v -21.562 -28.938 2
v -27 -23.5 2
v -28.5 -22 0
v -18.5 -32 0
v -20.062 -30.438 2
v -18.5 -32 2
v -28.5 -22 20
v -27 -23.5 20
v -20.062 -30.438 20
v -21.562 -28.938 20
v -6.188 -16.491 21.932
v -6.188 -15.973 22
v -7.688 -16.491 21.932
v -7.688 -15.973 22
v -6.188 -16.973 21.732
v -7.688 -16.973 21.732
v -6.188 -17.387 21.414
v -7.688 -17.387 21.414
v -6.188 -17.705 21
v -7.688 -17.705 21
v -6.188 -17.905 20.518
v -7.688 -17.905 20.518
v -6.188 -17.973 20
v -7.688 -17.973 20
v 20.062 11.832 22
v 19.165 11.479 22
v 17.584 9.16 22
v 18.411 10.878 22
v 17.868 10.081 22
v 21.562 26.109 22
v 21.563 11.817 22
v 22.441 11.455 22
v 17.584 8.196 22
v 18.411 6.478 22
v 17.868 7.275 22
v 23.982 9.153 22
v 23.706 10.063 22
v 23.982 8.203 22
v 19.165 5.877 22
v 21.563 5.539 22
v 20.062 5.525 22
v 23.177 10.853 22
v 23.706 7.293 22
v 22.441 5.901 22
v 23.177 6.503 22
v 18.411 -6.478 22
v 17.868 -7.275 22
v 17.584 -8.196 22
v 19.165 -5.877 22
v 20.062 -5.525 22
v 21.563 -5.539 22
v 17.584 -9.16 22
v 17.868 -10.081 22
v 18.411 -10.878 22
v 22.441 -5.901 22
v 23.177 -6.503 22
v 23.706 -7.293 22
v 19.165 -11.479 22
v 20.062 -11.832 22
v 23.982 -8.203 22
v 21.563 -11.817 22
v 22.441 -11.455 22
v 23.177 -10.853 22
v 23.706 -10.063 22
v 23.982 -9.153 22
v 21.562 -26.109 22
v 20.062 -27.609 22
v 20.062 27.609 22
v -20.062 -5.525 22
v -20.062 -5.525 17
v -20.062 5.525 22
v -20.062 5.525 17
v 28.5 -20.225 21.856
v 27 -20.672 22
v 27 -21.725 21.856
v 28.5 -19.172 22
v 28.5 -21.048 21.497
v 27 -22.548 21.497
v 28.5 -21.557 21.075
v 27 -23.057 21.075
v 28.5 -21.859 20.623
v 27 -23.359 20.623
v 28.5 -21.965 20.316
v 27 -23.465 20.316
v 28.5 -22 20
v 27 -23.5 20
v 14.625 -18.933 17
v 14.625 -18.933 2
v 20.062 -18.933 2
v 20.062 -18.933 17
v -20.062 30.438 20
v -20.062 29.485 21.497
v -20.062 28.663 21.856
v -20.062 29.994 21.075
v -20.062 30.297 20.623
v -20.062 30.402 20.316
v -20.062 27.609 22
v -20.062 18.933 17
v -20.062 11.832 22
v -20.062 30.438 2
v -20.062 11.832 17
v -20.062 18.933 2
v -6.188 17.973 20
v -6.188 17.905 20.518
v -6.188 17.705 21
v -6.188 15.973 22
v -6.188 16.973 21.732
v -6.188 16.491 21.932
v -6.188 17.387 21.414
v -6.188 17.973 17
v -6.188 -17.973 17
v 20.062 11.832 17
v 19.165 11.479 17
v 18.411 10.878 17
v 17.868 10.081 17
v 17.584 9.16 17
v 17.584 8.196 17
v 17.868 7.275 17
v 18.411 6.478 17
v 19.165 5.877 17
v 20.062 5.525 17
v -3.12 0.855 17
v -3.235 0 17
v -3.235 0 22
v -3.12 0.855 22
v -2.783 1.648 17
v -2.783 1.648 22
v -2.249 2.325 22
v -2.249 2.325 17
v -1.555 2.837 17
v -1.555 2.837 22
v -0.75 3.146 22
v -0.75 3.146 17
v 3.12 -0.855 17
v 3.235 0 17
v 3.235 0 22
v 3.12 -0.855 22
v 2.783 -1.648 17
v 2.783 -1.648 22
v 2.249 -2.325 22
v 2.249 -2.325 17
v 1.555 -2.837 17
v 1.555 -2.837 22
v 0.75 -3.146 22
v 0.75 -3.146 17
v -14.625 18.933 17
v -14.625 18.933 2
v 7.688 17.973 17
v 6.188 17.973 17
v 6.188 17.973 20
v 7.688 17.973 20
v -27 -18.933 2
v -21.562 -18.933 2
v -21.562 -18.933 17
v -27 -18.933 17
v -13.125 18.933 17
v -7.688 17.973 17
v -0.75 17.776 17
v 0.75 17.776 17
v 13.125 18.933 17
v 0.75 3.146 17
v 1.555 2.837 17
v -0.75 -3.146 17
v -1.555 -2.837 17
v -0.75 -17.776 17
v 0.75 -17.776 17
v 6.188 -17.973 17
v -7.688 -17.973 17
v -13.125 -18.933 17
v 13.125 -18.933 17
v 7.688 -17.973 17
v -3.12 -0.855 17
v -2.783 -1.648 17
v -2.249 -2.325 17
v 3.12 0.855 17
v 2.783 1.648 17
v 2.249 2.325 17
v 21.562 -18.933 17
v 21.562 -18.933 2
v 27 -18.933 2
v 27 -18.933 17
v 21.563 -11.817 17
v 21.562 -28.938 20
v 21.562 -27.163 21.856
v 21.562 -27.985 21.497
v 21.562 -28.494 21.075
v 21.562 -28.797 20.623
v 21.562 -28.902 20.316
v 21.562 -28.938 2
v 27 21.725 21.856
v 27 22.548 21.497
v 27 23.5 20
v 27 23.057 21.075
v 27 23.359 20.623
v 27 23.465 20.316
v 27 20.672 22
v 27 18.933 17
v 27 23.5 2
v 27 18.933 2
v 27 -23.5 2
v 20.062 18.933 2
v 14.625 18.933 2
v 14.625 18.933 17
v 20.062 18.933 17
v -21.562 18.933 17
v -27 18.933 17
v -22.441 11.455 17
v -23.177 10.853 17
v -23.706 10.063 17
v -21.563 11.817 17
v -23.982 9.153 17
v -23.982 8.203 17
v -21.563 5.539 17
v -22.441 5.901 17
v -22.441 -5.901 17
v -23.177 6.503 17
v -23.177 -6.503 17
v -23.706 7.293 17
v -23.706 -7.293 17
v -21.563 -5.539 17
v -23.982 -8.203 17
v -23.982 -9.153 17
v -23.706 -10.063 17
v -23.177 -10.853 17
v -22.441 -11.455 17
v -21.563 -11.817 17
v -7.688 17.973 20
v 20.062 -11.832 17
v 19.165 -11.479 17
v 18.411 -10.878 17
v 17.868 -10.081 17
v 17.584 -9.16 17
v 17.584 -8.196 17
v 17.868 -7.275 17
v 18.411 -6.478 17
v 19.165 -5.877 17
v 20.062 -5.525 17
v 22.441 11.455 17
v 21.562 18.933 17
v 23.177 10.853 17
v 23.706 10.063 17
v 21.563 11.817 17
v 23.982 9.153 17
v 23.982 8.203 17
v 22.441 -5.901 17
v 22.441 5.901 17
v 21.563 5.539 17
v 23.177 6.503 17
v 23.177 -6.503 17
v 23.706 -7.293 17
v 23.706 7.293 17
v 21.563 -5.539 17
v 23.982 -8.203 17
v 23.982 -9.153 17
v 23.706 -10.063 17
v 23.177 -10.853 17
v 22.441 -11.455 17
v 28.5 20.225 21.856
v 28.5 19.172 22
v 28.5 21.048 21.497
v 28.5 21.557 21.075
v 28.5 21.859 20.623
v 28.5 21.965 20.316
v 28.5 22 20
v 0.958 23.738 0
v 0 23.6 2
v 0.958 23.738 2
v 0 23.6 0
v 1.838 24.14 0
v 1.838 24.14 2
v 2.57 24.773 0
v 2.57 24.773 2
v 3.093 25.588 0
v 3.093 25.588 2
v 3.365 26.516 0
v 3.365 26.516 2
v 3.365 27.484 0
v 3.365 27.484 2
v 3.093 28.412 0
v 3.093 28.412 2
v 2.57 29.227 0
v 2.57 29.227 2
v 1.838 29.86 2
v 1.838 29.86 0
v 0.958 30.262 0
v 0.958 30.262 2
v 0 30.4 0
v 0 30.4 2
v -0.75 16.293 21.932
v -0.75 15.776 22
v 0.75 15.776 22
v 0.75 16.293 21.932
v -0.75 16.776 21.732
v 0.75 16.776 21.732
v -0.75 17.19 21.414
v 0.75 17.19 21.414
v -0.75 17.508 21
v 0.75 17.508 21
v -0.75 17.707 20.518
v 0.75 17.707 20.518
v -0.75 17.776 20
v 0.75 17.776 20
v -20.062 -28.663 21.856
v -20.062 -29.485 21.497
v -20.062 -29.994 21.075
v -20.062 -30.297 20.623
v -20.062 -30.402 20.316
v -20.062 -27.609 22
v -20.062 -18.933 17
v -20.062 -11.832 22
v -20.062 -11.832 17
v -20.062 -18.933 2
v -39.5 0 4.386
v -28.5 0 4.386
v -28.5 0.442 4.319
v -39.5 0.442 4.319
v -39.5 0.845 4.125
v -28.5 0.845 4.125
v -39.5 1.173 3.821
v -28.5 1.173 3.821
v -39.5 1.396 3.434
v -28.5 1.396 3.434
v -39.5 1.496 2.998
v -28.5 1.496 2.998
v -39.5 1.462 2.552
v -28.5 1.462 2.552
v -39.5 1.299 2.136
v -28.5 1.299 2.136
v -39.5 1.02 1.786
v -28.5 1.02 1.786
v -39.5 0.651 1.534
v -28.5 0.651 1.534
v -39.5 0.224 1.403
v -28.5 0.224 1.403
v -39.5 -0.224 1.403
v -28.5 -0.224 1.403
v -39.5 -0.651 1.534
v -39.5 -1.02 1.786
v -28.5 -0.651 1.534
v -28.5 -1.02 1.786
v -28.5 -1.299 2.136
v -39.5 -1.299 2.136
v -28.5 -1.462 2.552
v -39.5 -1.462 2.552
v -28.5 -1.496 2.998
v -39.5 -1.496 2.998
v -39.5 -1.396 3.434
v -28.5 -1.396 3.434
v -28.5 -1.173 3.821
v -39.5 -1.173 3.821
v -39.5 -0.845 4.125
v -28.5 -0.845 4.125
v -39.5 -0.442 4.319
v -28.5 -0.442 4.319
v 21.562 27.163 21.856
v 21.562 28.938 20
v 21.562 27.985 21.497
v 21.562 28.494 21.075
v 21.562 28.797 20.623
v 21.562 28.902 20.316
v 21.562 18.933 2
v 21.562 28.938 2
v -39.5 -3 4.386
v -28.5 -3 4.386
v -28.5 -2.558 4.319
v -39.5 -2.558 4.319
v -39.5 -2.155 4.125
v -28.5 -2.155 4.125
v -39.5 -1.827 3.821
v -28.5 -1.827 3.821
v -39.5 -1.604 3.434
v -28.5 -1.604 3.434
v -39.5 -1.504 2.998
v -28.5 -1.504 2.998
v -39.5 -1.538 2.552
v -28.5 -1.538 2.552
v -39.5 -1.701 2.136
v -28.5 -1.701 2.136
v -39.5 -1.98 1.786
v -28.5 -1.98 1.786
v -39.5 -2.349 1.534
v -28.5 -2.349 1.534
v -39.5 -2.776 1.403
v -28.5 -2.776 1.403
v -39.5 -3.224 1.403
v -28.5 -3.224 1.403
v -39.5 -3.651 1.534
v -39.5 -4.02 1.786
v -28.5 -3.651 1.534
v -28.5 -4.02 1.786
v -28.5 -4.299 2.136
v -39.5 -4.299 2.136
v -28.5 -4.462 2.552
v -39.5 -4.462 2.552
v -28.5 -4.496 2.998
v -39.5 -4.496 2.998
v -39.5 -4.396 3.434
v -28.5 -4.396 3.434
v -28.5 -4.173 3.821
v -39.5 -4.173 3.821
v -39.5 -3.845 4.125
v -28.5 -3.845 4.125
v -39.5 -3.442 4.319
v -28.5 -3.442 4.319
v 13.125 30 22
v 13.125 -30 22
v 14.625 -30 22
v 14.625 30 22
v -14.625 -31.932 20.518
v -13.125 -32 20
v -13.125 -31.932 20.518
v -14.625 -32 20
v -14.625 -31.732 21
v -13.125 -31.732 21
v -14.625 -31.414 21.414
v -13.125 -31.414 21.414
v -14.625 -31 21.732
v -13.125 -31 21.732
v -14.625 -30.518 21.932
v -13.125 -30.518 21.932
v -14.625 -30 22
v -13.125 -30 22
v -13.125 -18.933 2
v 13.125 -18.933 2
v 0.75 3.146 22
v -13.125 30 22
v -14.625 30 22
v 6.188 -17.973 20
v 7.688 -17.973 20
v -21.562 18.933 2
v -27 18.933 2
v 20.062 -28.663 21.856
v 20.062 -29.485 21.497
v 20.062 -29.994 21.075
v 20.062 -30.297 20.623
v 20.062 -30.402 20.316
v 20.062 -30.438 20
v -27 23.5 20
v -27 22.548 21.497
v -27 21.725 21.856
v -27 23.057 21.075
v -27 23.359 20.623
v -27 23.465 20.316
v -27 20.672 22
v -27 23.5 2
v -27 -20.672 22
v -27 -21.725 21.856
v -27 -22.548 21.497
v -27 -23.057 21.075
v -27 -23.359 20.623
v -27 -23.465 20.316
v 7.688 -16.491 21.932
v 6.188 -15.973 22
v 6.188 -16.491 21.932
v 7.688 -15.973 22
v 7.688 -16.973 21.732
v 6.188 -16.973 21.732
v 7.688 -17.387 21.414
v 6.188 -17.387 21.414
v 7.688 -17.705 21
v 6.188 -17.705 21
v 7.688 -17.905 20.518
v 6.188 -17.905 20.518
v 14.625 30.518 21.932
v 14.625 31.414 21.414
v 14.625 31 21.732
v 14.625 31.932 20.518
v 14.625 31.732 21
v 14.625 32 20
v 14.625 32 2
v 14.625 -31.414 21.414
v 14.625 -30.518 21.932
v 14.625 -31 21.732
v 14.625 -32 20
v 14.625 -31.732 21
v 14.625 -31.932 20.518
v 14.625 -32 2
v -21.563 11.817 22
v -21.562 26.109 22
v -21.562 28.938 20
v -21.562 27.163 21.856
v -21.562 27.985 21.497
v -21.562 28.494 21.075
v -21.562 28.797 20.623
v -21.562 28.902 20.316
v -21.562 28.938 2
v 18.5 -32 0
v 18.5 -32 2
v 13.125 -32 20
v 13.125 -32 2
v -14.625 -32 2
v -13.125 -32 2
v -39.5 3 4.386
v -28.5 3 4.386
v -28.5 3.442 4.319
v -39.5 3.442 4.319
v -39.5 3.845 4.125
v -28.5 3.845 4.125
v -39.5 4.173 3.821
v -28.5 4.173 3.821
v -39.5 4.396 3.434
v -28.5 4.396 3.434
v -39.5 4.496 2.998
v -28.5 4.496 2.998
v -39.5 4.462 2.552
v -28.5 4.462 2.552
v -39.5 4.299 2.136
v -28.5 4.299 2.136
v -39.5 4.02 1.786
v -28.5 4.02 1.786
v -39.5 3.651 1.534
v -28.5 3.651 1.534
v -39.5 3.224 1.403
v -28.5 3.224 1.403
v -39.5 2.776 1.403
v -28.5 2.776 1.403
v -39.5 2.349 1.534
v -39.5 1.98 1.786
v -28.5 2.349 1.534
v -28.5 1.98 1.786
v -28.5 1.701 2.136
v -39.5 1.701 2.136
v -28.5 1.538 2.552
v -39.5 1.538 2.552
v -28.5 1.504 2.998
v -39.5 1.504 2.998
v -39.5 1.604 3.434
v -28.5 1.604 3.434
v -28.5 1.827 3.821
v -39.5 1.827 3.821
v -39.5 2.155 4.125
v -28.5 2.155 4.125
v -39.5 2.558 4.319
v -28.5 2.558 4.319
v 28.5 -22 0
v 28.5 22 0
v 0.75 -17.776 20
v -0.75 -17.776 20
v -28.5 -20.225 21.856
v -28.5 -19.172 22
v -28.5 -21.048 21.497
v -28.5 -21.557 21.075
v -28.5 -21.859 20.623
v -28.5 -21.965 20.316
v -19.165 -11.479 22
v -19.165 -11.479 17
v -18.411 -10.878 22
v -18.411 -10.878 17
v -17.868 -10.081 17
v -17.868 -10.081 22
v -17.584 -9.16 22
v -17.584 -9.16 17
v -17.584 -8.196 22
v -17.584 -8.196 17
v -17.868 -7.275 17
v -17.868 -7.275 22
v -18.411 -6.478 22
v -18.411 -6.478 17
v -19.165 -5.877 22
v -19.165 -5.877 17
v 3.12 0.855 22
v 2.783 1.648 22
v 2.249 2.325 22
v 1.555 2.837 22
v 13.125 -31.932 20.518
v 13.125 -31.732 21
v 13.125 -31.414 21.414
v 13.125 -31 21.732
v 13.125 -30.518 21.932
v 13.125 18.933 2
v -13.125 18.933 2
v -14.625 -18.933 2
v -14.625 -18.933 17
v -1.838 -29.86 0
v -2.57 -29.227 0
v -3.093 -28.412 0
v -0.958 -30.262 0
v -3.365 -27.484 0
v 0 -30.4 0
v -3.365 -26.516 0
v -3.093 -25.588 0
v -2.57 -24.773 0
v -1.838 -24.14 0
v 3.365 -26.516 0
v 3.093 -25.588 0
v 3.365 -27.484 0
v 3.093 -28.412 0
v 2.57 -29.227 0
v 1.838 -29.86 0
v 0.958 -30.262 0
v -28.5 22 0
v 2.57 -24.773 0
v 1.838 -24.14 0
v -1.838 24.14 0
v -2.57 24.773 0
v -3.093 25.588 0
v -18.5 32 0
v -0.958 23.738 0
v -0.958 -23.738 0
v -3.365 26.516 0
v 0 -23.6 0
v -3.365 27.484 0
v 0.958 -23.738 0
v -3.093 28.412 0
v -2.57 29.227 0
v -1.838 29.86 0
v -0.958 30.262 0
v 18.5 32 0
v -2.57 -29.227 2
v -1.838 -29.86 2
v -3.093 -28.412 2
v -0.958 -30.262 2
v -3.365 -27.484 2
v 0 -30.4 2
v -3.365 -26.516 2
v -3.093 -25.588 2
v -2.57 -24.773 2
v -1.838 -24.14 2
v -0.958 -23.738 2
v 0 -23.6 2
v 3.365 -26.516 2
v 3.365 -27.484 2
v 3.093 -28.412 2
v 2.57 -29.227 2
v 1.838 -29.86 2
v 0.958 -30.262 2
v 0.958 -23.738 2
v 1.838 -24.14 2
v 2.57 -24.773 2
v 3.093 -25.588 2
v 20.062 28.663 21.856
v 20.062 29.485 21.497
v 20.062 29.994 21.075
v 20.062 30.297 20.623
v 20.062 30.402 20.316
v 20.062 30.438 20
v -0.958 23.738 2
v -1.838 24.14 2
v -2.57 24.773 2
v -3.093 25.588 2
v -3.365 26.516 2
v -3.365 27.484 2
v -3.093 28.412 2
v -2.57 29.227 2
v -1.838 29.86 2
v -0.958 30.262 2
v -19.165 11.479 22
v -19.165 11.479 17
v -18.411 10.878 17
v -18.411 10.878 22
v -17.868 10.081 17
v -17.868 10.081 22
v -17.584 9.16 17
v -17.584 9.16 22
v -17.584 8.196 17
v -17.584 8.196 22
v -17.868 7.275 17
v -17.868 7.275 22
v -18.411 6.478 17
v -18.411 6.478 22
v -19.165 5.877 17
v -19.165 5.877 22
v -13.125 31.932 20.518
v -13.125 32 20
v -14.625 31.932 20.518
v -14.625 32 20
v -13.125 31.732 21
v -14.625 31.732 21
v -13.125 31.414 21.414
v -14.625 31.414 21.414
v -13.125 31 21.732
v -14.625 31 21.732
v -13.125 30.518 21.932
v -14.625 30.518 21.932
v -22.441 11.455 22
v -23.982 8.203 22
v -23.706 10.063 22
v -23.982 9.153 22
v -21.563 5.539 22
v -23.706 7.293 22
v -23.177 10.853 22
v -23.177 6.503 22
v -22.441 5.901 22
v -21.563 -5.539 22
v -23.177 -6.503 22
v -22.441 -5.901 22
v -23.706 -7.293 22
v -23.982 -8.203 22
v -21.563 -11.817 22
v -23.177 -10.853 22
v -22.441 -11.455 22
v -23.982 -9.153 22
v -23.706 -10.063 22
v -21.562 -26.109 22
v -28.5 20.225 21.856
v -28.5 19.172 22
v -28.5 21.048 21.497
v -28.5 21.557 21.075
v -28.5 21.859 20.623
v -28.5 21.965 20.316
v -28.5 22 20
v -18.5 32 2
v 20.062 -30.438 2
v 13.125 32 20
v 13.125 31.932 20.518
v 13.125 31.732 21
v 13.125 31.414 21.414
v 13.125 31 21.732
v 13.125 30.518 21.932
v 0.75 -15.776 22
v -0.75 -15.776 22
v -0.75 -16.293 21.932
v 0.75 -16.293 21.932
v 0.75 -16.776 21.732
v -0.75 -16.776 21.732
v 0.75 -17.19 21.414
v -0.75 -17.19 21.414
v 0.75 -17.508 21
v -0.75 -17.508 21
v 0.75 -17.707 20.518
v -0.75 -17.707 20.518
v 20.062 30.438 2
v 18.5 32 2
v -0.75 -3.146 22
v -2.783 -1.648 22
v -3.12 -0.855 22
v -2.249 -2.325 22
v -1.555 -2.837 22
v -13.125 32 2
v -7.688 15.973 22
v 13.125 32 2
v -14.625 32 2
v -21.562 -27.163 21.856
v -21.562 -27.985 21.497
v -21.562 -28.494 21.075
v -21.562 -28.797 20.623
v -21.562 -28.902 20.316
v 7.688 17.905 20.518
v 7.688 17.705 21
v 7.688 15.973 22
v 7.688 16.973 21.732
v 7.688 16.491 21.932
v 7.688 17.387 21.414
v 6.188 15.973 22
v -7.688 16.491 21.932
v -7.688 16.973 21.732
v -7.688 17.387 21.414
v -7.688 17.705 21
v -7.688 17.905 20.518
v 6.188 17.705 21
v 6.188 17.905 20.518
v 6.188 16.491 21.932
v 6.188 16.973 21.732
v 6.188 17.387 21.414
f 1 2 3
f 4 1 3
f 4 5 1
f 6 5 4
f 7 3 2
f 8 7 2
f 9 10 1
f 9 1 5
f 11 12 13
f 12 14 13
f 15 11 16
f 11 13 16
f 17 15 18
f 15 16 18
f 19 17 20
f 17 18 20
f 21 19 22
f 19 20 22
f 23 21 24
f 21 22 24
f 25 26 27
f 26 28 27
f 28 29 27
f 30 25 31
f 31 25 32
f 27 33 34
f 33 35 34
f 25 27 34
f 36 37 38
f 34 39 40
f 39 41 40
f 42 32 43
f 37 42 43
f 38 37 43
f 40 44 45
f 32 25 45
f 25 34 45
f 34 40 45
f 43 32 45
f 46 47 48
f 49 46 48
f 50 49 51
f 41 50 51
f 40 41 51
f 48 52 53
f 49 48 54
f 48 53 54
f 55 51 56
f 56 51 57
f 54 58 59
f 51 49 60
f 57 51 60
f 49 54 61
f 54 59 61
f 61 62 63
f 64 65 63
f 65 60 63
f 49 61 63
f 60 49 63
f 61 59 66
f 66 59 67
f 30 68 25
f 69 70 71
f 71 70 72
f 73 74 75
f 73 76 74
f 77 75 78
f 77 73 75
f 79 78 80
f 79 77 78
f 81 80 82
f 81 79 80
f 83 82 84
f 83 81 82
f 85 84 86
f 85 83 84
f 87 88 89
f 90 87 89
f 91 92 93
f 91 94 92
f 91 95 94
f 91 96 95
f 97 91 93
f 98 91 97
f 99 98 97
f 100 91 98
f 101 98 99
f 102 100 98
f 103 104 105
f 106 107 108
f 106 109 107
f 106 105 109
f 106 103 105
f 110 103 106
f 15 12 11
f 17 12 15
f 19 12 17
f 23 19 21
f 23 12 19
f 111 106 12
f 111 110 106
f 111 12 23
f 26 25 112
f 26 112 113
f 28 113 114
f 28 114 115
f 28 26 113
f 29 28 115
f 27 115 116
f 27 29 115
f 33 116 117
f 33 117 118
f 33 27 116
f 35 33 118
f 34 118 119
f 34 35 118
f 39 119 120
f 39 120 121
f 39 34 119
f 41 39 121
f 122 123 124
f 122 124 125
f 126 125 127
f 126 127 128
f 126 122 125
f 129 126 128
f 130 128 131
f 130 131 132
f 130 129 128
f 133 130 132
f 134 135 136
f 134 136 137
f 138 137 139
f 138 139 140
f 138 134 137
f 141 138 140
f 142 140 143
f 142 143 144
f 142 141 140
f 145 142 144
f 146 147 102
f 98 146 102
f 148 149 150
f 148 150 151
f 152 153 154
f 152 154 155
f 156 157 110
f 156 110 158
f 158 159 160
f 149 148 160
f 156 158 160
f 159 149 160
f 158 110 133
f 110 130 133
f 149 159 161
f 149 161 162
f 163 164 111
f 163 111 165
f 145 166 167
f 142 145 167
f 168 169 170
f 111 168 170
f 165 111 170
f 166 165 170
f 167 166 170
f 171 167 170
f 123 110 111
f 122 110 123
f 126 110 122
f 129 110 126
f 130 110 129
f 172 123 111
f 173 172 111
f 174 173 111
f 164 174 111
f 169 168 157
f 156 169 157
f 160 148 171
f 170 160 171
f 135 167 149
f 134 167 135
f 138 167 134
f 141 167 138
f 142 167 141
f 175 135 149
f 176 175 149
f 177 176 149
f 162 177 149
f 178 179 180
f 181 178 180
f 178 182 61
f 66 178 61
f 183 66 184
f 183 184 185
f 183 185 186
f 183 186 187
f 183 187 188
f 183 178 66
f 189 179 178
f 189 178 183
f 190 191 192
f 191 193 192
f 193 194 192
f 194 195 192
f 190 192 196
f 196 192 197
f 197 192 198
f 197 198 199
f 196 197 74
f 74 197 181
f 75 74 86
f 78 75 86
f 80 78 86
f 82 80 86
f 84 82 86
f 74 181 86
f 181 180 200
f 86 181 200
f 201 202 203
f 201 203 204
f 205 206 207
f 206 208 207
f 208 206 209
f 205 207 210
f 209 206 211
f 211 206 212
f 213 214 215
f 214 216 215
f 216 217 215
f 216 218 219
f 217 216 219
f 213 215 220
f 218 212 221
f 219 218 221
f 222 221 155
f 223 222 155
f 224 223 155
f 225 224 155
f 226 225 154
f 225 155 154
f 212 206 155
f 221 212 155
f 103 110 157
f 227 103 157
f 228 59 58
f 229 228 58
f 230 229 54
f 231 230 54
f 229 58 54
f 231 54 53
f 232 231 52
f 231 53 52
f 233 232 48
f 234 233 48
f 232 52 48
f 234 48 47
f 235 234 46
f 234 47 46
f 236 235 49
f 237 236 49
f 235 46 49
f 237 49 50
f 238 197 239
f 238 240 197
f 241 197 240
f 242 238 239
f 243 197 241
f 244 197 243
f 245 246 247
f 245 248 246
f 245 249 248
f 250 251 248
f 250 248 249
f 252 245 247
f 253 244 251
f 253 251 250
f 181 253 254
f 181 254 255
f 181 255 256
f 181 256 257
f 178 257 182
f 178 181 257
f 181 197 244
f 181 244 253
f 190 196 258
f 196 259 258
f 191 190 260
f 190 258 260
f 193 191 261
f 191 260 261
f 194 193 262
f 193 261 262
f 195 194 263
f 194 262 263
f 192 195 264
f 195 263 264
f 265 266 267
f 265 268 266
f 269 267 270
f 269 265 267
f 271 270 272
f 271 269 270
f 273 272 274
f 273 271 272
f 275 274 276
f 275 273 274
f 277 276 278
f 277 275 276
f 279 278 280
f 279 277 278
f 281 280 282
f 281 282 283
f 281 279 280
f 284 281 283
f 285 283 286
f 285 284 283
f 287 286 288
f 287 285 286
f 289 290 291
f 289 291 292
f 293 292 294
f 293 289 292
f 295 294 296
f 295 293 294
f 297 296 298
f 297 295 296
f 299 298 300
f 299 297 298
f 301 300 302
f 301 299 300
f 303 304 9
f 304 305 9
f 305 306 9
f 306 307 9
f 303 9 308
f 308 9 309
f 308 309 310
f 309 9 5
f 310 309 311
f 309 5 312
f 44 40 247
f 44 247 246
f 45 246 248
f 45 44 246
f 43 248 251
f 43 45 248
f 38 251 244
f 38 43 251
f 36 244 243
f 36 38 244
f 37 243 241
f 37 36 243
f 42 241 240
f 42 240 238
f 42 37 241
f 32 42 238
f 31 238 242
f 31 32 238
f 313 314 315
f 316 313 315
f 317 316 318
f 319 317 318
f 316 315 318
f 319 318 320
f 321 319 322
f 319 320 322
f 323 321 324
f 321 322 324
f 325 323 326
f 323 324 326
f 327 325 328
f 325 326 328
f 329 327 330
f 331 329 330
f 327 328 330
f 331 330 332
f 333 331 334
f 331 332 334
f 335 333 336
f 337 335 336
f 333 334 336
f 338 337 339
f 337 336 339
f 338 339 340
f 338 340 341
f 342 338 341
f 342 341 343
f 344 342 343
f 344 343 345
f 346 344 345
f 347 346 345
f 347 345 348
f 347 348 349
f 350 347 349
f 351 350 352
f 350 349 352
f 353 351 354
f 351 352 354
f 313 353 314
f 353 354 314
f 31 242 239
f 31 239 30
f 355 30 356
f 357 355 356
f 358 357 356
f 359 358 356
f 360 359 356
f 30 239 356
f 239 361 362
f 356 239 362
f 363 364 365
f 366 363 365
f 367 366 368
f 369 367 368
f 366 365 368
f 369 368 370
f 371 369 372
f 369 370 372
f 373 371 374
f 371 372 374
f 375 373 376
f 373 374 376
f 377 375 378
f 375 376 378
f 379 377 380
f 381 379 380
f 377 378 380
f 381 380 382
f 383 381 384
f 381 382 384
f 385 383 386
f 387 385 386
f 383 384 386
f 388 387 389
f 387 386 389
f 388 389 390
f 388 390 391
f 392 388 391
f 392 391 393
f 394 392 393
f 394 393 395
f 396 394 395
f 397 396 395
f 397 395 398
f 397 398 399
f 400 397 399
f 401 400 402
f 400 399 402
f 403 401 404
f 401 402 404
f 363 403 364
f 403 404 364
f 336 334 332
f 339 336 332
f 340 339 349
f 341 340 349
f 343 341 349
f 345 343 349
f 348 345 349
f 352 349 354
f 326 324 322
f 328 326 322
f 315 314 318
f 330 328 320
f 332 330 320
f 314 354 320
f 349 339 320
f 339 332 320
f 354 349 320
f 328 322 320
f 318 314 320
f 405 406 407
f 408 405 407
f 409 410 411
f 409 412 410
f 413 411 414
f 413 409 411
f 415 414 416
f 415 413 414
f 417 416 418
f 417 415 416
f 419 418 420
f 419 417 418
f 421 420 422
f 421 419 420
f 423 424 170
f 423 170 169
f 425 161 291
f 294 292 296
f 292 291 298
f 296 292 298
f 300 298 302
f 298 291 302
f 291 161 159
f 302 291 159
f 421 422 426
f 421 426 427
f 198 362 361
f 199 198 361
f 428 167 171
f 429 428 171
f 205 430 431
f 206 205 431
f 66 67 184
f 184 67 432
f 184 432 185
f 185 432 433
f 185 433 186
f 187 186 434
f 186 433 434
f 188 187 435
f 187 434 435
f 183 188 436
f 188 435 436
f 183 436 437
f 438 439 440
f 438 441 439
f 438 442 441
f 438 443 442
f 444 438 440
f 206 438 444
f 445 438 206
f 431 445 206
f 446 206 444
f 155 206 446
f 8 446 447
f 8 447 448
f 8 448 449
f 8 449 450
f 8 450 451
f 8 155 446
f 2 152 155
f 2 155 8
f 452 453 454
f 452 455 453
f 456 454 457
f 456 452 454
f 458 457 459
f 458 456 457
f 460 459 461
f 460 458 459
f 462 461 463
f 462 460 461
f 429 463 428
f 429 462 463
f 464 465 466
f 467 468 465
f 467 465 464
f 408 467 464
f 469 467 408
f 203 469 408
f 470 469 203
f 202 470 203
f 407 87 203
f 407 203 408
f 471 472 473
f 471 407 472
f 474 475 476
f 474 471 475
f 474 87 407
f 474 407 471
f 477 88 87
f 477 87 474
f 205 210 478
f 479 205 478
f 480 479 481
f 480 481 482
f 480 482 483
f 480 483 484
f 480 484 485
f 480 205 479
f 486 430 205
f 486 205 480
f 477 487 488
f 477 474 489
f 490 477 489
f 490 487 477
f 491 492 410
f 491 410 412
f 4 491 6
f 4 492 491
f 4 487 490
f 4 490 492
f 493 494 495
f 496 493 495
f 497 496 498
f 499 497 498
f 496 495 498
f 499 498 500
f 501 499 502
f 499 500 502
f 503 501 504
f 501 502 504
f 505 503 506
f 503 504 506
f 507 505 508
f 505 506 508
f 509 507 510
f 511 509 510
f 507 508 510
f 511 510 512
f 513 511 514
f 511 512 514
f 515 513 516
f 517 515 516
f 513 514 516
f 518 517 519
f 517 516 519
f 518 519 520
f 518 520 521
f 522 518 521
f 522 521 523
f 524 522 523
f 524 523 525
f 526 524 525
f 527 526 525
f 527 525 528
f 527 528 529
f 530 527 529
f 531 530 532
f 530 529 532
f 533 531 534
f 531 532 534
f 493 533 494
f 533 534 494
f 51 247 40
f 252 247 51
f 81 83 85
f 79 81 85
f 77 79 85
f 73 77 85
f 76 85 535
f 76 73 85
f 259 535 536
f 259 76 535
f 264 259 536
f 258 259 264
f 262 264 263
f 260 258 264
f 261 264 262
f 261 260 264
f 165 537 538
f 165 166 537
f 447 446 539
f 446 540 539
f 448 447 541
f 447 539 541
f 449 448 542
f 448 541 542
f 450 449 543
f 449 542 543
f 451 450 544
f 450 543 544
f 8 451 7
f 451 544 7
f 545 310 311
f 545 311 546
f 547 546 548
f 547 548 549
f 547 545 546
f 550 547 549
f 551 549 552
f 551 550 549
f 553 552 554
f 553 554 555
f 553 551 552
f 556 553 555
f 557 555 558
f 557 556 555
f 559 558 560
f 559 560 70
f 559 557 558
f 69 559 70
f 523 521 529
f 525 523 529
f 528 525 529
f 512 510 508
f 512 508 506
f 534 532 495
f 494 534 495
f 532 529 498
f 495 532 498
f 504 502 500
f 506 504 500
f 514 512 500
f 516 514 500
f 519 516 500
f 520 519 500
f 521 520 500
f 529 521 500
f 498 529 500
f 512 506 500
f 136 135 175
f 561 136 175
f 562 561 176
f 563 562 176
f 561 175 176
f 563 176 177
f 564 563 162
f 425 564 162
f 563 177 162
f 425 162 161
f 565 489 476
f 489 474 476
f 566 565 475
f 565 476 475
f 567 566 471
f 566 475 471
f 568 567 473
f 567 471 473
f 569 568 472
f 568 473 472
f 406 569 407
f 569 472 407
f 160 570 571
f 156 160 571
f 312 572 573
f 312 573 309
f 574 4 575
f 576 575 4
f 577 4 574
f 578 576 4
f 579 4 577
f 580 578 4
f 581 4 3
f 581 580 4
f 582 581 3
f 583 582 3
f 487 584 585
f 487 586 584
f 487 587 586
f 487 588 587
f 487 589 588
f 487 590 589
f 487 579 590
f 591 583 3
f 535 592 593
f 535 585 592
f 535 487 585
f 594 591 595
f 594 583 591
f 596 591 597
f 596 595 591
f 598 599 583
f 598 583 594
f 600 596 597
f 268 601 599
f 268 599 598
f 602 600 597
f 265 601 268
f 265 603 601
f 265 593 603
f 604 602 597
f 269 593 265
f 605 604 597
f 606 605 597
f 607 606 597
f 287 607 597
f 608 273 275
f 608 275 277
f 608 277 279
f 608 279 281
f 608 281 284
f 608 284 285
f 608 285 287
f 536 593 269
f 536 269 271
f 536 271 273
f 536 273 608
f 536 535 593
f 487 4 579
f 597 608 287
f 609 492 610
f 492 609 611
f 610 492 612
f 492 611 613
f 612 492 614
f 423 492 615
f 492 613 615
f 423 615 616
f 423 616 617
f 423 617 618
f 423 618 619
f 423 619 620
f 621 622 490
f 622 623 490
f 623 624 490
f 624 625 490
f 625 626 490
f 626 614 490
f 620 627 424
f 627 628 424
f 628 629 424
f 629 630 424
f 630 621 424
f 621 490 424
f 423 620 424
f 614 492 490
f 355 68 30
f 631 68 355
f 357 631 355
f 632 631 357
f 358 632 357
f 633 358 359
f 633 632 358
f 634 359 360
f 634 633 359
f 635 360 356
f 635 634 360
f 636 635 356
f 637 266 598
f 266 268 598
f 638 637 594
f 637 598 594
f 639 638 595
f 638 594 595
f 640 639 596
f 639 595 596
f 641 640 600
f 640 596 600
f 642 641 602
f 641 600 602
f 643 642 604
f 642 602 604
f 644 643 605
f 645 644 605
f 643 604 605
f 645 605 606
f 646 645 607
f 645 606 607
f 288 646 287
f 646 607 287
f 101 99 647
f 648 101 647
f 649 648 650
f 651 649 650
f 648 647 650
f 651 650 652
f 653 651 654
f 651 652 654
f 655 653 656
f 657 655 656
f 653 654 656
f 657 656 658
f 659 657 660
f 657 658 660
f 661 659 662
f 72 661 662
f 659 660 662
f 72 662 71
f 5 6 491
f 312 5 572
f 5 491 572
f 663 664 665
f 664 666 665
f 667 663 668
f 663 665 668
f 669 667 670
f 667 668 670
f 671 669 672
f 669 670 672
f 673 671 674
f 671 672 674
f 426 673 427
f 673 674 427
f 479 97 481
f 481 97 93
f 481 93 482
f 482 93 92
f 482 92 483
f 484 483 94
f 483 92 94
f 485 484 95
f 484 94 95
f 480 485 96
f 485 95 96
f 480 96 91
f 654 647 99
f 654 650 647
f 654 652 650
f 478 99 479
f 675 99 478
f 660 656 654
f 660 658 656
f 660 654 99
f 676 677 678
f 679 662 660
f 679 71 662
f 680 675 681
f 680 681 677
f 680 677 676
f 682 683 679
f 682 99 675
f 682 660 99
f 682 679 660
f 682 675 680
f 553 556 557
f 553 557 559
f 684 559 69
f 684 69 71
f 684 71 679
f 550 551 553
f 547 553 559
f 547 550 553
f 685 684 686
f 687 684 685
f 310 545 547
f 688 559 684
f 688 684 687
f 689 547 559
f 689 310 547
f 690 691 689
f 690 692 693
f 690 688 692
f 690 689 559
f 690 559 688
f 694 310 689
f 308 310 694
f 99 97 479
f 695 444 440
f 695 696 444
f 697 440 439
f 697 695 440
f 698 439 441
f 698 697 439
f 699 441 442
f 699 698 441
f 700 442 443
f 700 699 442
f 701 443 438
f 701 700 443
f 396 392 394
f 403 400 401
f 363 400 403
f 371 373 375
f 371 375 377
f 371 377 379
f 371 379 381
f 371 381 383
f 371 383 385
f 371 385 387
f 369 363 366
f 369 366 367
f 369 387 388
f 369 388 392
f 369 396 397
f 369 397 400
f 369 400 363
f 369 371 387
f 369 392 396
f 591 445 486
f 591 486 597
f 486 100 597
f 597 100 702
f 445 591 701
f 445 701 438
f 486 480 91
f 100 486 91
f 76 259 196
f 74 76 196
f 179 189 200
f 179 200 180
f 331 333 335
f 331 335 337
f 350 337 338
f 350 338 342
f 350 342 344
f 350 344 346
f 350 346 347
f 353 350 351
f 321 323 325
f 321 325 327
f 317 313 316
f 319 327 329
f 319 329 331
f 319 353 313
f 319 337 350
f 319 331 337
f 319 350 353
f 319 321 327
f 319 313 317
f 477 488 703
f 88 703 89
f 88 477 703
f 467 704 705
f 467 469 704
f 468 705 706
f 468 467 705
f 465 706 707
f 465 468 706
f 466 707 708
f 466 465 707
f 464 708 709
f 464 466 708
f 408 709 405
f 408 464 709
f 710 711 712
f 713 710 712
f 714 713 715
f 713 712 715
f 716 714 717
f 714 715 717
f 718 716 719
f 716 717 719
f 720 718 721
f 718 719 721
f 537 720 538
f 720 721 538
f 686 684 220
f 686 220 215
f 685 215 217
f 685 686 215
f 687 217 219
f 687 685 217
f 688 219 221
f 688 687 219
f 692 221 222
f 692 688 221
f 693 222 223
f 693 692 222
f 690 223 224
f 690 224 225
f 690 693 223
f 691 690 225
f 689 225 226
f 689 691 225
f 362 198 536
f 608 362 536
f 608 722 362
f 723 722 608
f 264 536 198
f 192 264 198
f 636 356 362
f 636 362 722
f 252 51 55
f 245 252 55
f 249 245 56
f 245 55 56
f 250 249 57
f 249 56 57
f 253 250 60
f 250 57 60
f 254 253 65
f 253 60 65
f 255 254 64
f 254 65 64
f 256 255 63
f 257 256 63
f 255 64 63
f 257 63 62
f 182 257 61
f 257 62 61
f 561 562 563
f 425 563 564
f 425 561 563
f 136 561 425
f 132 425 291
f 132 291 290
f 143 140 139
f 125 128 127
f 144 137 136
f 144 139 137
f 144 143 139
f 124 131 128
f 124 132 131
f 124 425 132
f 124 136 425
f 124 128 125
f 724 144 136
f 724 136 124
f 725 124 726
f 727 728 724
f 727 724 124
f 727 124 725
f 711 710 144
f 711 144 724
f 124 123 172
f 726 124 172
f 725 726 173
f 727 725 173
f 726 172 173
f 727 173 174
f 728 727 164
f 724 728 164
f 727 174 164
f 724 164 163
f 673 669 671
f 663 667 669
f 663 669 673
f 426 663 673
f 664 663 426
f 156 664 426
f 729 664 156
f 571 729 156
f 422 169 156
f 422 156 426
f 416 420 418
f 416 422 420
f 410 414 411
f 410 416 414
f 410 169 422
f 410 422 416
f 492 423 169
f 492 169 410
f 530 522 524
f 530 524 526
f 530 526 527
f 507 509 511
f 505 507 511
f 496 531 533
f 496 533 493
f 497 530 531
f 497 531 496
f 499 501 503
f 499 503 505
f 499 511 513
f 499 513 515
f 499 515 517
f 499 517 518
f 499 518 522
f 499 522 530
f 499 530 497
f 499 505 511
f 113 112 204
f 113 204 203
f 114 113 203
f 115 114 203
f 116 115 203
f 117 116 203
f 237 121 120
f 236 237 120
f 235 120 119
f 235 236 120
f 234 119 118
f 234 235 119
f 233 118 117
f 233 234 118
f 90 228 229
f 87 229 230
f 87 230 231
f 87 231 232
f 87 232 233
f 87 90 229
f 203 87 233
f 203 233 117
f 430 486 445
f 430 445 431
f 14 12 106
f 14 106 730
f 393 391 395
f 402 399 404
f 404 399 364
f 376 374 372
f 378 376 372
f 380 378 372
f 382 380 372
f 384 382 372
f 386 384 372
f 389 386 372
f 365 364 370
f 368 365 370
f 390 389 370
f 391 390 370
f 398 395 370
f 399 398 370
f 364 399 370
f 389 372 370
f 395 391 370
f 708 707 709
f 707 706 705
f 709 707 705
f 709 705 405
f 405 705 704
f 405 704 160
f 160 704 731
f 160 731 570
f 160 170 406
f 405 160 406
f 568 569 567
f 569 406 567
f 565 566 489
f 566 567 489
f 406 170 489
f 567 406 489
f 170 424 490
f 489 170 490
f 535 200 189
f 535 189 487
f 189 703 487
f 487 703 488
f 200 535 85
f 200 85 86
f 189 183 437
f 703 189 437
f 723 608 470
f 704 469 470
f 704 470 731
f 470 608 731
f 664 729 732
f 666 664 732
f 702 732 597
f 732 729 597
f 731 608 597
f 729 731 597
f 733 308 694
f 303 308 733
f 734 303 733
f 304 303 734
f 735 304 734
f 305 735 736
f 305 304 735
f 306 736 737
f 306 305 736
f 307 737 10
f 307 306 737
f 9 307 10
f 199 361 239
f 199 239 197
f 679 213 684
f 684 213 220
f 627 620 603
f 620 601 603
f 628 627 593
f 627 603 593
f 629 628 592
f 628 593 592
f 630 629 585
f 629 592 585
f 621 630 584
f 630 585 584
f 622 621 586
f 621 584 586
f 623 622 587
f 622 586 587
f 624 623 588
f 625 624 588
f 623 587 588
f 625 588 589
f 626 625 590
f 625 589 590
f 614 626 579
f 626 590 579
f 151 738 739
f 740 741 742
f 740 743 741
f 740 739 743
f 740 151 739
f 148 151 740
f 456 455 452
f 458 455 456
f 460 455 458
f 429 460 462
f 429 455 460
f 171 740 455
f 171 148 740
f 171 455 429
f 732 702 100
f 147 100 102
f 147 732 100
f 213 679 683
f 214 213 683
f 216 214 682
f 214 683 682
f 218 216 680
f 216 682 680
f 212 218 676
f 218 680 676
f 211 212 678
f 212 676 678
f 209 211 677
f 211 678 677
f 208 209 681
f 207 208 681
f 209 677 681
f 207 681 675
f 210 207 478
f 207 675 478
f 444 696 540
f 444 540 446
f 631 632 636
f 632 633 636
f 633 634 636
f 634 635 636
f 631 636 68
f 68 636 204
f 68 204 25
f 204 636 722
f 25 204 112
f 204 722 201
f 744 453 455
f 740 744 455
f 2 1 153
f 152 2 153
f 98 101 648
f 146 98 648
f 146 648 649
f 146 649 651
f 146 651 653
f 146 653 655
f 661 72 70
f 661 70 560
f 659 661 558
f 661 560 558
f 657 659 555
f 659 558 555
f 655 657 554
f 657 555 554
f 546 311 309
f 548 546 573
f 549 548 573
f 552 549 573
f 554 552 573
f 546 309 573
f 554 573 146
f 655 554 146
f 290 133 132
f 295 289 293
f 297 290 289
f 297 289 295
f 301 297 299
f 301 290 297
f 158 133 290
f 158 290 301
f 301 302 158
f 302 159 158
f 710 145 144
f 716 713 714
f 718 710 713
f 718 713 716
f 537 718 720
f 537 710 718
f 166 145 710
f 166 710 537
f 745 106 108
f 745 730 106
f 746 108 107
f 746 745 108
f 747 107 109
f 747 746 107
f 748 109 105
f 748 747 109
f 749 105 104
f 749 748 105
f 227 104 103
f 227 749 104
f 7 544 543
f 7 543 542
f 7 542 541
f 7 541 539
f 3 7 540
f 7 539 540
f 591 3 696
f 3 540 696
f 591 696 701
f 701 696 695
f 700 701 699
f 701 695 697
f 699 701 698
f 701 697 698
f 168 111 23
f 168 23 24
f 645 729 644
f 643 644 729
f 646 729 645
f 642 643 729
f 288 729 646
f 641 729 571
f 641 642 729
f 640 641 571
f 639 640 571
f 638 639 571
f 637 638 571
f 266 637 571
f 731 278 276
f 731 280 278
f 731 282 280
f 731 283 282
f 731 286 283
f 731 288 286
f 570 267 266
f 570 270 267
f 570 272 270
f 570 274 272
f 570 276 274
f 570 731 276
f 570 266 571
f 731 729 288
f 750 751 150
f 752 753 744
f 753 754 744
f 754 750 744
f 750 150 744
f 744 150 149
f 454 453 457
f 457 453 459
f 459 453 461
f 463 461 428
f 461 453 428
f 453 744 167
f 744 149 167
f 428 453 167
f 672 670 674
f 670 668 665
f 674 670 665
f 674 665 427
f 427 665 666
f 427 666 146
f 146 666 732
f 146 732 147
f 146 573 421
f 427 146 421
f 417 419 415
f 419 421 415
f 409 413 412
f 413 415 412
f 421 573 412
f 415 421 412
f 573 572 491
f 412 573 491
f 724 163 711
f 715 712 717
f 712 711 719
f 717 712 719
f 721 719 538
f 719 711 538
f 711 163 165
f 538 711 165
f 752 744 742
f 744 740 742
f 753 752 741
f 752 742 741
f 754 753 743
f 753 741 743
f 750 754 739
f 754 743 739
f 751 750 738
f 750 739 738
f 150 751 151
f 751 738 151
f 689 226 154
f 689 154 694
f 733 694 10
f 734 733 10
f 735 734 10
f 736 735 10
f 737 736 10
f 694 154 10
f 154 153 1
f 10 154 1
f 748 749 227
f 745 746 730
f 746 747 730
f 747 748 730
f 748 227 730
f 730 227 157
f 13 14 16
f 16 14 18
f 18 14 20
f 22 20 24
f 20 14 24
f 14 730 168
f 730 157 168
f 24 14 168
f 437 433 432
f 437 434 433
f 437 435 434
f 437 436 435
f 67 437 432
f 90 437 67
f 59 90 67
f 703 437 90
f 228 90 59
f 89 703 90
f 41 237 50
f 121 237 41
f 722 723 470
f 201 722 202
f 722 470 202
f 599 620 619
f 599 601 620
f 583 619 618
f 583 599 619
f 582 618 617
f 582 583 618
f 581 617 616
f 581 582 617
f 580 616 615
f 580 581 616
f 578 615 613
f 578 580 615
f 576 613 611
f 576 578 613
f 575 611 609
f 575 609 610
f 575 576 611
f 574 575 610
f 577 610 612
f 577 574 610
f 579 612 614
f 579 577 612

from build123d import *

# Parameters (mm, degrees)
SKIZZE1_R                                   = 3.4
AUFSATZ_LINEAR_AUSTRAGEN1_DEPTH             = 2
SKIZZE2_W                                   = 57
SKIZZE2_H                                   = 18.932808473
AUFSATZ_LINEAR_AUSTRAGEN2_DEPTH             = 15
SCHNITT_LINEAR_AUSTRAGEN1_DEPTH             = 47.100433837
SCHNITT_LINEAR_AUSTRAGEN1_DEPTH_BACK        = 47.100433837
SKIZZE3_W                                   = 34.623433363
SKIZZE3_H                                   = 45.110839659
AUFSATZ_LINEAR_AUSTRAGEN3_REACH             = 48.1
SKIZZE4_W                                   = 1.5
SKIZZE4_H                                   = 32
SKIZZE4_H_2                                 = 17.972917063
SKIZZE4_W_2                                 = 0.75
SKIZZE4_H_3                                 = 17.775625357
AUFSATZ_LINEAR_AUSTRAGEN3_DIRECTION_2_DEPTH = 5
VERRUNDUNG1_R                               = 2
SKIZZE5_R                                   = 3.234578413
AUFSATZ_LINEAR_AUSTRAGEN4_DEPTH             = 5
AUFSATZ_LINEAR_AUSTRAGEN7_DEPTH             = 5
SKIZZE7_R                                   = 1.5
AUFSATZ_LINEAR_AUSTRAGEN9_DEPTH             = 11
AUFSATZ_LINEAR_AUSTRAGEN9_2_DEPTH           = 11
AUFSATZ_LINEAR_AUSTRAGEN9_3_DEPTH           = 11


with BuildPart() as part:
    # Skizze1 → Aufsatz-Linear austragen1 (new body)
    with BuildSketch(Plane(origin=(0, 0, 0), x_dir=(0, 1, 0), z_dir=(0, 0, 1))):
        Polygon((22, 28.5), (32, 18.5), (32, -18.5), (22, -28.5), (0, -28.5), (0, 28.5), align=None)
        with Locations(Location((27, 0, 0), (0, 0, 270))):
            Circle(SKIZZE1_R, mode=Mode.SUBTRACT)
    extrude(amount=AUFSATZ_LINEAR_AUSTRAGEN1_DEPTH)

    # Skizze2 → Aufsatz-Linear austragen2 (add)
    with BuildSketch(Plane.XY.offset(2)):
        with Locations((0, 9.466404237)):
            Rectangle(SKIZZE2_W, SKIZZE2_H)
    extrude(amount=AUFSATZ_LINEAR_AUSTRAGEN2_DEPTH)

    # Skizze3 → Schnitt-Linear austragen1 (cut, two sides: drawn at the far end of the back side and taken through both)
    with BuildSketch(Plane.XY.offset(17).offset(-SCHNITT_LINEAR_AUSTRAGEN1_DEPTH_BACK)):
        with Locations((-17.311716682, 22.555419829)):
            Rectangle(SKIZZE3_W, SKIZZE3_H)
    extrude(amount=SCHNITT_LINEAR_AUSTRAGEN1_DEPTH + SCHNITT_LINEAR_AUSTRAGEN1_DEPTH_BACK, mode=Mode.SUBTRACT)

    # Aufsatz-Linear austragen3: up to this face of the body (flat: up to its plane)
    aufsatz_linear_austragen3_end = Plane(part.part.faces().sort_by_distance((13.22034684, 24.848962234, 2))[0])
    # Skizze4 → Aufsatz-Linear austragen3 (add, up to the picked face)
    with BuildSketch(Plane.XY.offset(17), mode=Mode.PRIVATE) as aufsatz_linear_austragen3_sk1:
        with Locations((13.875, 16)):
            Rectangle(SKIZZE4_W, SKIZZE4_H)
    aufsatz_linear_austragen3_tool1 = split(extrude(aufsatz_linear_austragen3_sk1.sketch, amount=-AUFSATZ_LINEAR_AUSTRAGEN3_REACH, mode=Mode.PRIVATE), bisect_by=aufsatz_linear_austragen3_end, keep=Keep.BOTH, mode=Mode.PRIVATE)
    # Skizze4 → Aufsatz-Linear austragen3 (add, up to the picked face)
    with BuildSketch(Plane.XY.offset(17), mode=Mode.PRIVATE) as aufsatz_linear_austragen3_sk2:
        Polygon((27, 23.5), (28.5, 22), (28.5, 0), (27, 0), align=None)
    aufsatz_linear_austragen3_tool2 = split(extrude(aufsatz_linear_austragen3_sk2.sketch, amount=-AUFSATZ_LINEAR_AUSTRAGEN3_REACH, mode=Mode.PRIVATE), bisect_by=aufsatz_linear_austragen3_end, keep=Keep.BOTH, mode=Mode.PRIVATE)
    # Skizze4 → Aufsatz-Linear austragen3 (add, up to the picked face)
    with BuildSketch(Plane.XY.offset(17), mode=Mode.PRIVATE) as aufsatz_linear_austragen3_sk3:
        Polygon((20.0625, 0), (21.5625, 0), (21.5625, 28.9375), (20.0625, 30.4375), align=None)
    aufsatz_linear_austragen3_tool3 = split(extrude(aufsatz_linear_austragen3_sk3.sketch, amount=-AUFSATZ_LINEAR_AUSTRAGEN3_REACH, mode=Mode.PRIVATE), bisect_by=aufsatz_linear_austragen3_end, keep=Keep.BOTH, mode=Mode.PRIVATE)
    # Skizze4 → Aufsatz-Linear austragen3 (add, up to the picked face)
    with BuildSketch(Plane.XY.offset(17), mode=Mode.PRIVATE) as aufsatz_linear_austragen3_sk4:
        with Locations((6.9375, 8.986458532)):
            Rectangle(SKIZZE4_W, SKIZZE4_H_2)
    aufsatz_linear_austragen3_tool4 = split(extrude(aufsatz_linear_austragen3_sk4.sketch, amount=-AUFSATZ_LINEAR_AUSTRAGEN3_REACH, mode=Mode.PRIVATE), bisect_by=aufsatz_linear_austragen3_end, keep=Keep.BOTH, mode=Mode.PRIVATE)
    # Skizze4 → Aufsatz-Linear austragen3 (add, up to the picked face)
    with BuildSketch(Plane.XY.offset(17), mode=Mode.PRIVATE) as aufsatz_linear_austragen3_sk5:
        with Locations((0.375, 8.887812679)):
            Rectangle(SKIZZE4_W_2, SKIZZE4_H_3)
    aufsatz_linear_austragen3_tool5 = split(extrude(aufsatz_linear_austragen3_sk5.sketch, amount=-AUFSATZ_LINEAR_AUSTRAGEN3_REACH, mode=Mode.PRIVATE), bisect_by=aufsatz_linear_austragen3_end, keep=Keep.BOTH, mode=Mode.PRIVATE)
    add(aufsatz_linear_austragen3_tool1.solids().sort_by(Axis((13.875, 16, 17), (0, 0, -1)))[0])
    add(aufsatz_linear_austragen3_tool2.solids().sort_by(Axis((27.741758, 11.379121, 17), (0, 0, -1)))[0])
    add(aufsatz_linear_austragen3_tool3.solids().sort_by(Axis((20.806184, 14.846908, 17), (0, 0, -1)))[0])
    add(aufsatz_linear_austragen3_tool4.solids().sort_by(Axis((6.9375, 8.986459, 17), (0, 0, -1)))[0])
    add(aufsatz_linear_austragen3_tool5.solids().sort_by(Axis((0.375, 8.887813, 17), (0, 0, -1)))[0])

    # Skizze4 → Aufsatz-Linear austragen3 direction 2 (add)
    with BuildSketch(Plane.XY.offset(17)):
        with Locations((13.875, 16)):
            Rectangle(SKIZZE4_W, SKIZZE4_H)
        Polygon((27, 23.5), (28.5, 22), (28.5, 0), (27, 0), align=None)
        Polygon((20.0625, 0), (21.5625, 0), (21.5625, 28.9375), (20.0625, 30.4375), align=None)
        with Locations((6.9375, 8.986458532)):
            Rectangle(SKIZZE4_W, SKIZZE4_H_2)
        with Locations((0.375, 8.887812679)):
            Rectangle(SKIZZE4_W_2, SKIZZE4_H_3)
    extrude(amount=AUFSATZ_LINEAR_AUSTRAGEN3_DIRECTION_2_DEPTH)

    # Verrundung1
    verrundung1_edges = [part.edges().sort_by_distance(p)[0] for p in [
        (0.375, 17.775625357, 22),
        (27.75, 22.75, 22),
        (20.8125, 29.6875, 22),
        (13.875, 32, 22),
        (6.9375, 17.972917063, 22),
    ]]
    fillet(verrundung1_edges, radius=VERRUNDUNG1_R)

    # Skizze5 → Aufsatz-Linear austragen4 (add)
    with BuildSketch(Plane.XY.offset(22)):
        with Locations((20.782589152, 8.678120593)):
            Circle(SKIZZE5_R)
    extrude(amount=-AUFSATZ_LINEAR_AUSTRAGEN4_DEPTH)

    # Skizze6 → Aufsatz-Linear austragen7 (add)
    with BuildSketch(Plane.XY.offset(17)):
        with BuildLine():
            Line((0.75, 0), (3.234578413, 0))
            ThreePointArc((3.234578413, 0), (2.538545974, 2.004565252), (0.75, 3.146426149))
            Line((0.75, 3.146426149), (0.75, 0))
        make_face()
        with BuildLine():
            Line((0, 0), (0.75, 0))
            Line((0.75, 0), (0.75, 3.146426149))
            ThreePointArc((0.75, 3.146426149), (0.377581389, 3.212464755), (0, 3.234578413))
            Line((0, 3.234578413), (0, 0))
        make_face()
    extrude(amount=AUFSATZ_LINEAR_AUSTRAGEN7_DEPTH)

    # Spiegeln1: part across face


with BuildPart() as part_1:
    add(part.part)
    add(part.part.mirror(Plane(origin=(14.039898882, 0, 9.457090178), x_dir=(0, 0, 1), z_dir=(0, -1, 0))))

    # Spiegeln2: part across plane


with BuildPart() as part_2:
    add(part_1.part)
    add(part_1.part.mirror(Plane(origin=(0, 0, 0), x_dir=(0, 0, 1), z_dir=(1, 0, 0))))


with BuildPart() as body_2:
    # Skizze7 → Aufsatz-Linear austragen9 (new body)
    with BuildSketch(Plane(origin=(-28.5, 0, 0), x_dir=(0, -1, 0), z_dir=(-1, 0, 0))):
        with Locations(Location((-3, 2.885859275, 0), (0, 0, 90))):
            Circle(SKIZZE7_R)
    extrude(amount=AUFSATZ_LINEAR_AUSTRAGEN9_DEPTH)


with BuildPart() as body_3:
    # Skizze7 → Aufsatz-Linear austragen9 2 (new body)
    with BuildSketch(Plane(origin=(-28.5, 0, 0), x_dir=(0, -1, 0), z_dir=(-1, 0, 0))):
        with Locations(Location((0, 2.885859275, 0), (0, 0, 90))):
            Circle(SKIZZE7_R)
    extrude(amount=AUFSATZ_LINEAR_AUSTRAGEN9_2_DEPTH)


with BuildPart() as body_4:
    # Skizze7 → Aufsatz-Linear austragen9 3 (new body)
    with BuildSketch(Plane(origin=(-28.5, 0, 0), x_dir=(0, -1, 0), z_dir=(-1, 0, 0))):
        with Locations(Location((3, 2.885859275, 0), (0, 0, 90))):
            Circle(SKIZZE7_R)
    extrude(amount=AUFSATZ_LINEAR_AUSTRAGEN9_3_DEPTH)


solid = Compound([part_2.part, body_2.part, body_3.part, body_4.part])
